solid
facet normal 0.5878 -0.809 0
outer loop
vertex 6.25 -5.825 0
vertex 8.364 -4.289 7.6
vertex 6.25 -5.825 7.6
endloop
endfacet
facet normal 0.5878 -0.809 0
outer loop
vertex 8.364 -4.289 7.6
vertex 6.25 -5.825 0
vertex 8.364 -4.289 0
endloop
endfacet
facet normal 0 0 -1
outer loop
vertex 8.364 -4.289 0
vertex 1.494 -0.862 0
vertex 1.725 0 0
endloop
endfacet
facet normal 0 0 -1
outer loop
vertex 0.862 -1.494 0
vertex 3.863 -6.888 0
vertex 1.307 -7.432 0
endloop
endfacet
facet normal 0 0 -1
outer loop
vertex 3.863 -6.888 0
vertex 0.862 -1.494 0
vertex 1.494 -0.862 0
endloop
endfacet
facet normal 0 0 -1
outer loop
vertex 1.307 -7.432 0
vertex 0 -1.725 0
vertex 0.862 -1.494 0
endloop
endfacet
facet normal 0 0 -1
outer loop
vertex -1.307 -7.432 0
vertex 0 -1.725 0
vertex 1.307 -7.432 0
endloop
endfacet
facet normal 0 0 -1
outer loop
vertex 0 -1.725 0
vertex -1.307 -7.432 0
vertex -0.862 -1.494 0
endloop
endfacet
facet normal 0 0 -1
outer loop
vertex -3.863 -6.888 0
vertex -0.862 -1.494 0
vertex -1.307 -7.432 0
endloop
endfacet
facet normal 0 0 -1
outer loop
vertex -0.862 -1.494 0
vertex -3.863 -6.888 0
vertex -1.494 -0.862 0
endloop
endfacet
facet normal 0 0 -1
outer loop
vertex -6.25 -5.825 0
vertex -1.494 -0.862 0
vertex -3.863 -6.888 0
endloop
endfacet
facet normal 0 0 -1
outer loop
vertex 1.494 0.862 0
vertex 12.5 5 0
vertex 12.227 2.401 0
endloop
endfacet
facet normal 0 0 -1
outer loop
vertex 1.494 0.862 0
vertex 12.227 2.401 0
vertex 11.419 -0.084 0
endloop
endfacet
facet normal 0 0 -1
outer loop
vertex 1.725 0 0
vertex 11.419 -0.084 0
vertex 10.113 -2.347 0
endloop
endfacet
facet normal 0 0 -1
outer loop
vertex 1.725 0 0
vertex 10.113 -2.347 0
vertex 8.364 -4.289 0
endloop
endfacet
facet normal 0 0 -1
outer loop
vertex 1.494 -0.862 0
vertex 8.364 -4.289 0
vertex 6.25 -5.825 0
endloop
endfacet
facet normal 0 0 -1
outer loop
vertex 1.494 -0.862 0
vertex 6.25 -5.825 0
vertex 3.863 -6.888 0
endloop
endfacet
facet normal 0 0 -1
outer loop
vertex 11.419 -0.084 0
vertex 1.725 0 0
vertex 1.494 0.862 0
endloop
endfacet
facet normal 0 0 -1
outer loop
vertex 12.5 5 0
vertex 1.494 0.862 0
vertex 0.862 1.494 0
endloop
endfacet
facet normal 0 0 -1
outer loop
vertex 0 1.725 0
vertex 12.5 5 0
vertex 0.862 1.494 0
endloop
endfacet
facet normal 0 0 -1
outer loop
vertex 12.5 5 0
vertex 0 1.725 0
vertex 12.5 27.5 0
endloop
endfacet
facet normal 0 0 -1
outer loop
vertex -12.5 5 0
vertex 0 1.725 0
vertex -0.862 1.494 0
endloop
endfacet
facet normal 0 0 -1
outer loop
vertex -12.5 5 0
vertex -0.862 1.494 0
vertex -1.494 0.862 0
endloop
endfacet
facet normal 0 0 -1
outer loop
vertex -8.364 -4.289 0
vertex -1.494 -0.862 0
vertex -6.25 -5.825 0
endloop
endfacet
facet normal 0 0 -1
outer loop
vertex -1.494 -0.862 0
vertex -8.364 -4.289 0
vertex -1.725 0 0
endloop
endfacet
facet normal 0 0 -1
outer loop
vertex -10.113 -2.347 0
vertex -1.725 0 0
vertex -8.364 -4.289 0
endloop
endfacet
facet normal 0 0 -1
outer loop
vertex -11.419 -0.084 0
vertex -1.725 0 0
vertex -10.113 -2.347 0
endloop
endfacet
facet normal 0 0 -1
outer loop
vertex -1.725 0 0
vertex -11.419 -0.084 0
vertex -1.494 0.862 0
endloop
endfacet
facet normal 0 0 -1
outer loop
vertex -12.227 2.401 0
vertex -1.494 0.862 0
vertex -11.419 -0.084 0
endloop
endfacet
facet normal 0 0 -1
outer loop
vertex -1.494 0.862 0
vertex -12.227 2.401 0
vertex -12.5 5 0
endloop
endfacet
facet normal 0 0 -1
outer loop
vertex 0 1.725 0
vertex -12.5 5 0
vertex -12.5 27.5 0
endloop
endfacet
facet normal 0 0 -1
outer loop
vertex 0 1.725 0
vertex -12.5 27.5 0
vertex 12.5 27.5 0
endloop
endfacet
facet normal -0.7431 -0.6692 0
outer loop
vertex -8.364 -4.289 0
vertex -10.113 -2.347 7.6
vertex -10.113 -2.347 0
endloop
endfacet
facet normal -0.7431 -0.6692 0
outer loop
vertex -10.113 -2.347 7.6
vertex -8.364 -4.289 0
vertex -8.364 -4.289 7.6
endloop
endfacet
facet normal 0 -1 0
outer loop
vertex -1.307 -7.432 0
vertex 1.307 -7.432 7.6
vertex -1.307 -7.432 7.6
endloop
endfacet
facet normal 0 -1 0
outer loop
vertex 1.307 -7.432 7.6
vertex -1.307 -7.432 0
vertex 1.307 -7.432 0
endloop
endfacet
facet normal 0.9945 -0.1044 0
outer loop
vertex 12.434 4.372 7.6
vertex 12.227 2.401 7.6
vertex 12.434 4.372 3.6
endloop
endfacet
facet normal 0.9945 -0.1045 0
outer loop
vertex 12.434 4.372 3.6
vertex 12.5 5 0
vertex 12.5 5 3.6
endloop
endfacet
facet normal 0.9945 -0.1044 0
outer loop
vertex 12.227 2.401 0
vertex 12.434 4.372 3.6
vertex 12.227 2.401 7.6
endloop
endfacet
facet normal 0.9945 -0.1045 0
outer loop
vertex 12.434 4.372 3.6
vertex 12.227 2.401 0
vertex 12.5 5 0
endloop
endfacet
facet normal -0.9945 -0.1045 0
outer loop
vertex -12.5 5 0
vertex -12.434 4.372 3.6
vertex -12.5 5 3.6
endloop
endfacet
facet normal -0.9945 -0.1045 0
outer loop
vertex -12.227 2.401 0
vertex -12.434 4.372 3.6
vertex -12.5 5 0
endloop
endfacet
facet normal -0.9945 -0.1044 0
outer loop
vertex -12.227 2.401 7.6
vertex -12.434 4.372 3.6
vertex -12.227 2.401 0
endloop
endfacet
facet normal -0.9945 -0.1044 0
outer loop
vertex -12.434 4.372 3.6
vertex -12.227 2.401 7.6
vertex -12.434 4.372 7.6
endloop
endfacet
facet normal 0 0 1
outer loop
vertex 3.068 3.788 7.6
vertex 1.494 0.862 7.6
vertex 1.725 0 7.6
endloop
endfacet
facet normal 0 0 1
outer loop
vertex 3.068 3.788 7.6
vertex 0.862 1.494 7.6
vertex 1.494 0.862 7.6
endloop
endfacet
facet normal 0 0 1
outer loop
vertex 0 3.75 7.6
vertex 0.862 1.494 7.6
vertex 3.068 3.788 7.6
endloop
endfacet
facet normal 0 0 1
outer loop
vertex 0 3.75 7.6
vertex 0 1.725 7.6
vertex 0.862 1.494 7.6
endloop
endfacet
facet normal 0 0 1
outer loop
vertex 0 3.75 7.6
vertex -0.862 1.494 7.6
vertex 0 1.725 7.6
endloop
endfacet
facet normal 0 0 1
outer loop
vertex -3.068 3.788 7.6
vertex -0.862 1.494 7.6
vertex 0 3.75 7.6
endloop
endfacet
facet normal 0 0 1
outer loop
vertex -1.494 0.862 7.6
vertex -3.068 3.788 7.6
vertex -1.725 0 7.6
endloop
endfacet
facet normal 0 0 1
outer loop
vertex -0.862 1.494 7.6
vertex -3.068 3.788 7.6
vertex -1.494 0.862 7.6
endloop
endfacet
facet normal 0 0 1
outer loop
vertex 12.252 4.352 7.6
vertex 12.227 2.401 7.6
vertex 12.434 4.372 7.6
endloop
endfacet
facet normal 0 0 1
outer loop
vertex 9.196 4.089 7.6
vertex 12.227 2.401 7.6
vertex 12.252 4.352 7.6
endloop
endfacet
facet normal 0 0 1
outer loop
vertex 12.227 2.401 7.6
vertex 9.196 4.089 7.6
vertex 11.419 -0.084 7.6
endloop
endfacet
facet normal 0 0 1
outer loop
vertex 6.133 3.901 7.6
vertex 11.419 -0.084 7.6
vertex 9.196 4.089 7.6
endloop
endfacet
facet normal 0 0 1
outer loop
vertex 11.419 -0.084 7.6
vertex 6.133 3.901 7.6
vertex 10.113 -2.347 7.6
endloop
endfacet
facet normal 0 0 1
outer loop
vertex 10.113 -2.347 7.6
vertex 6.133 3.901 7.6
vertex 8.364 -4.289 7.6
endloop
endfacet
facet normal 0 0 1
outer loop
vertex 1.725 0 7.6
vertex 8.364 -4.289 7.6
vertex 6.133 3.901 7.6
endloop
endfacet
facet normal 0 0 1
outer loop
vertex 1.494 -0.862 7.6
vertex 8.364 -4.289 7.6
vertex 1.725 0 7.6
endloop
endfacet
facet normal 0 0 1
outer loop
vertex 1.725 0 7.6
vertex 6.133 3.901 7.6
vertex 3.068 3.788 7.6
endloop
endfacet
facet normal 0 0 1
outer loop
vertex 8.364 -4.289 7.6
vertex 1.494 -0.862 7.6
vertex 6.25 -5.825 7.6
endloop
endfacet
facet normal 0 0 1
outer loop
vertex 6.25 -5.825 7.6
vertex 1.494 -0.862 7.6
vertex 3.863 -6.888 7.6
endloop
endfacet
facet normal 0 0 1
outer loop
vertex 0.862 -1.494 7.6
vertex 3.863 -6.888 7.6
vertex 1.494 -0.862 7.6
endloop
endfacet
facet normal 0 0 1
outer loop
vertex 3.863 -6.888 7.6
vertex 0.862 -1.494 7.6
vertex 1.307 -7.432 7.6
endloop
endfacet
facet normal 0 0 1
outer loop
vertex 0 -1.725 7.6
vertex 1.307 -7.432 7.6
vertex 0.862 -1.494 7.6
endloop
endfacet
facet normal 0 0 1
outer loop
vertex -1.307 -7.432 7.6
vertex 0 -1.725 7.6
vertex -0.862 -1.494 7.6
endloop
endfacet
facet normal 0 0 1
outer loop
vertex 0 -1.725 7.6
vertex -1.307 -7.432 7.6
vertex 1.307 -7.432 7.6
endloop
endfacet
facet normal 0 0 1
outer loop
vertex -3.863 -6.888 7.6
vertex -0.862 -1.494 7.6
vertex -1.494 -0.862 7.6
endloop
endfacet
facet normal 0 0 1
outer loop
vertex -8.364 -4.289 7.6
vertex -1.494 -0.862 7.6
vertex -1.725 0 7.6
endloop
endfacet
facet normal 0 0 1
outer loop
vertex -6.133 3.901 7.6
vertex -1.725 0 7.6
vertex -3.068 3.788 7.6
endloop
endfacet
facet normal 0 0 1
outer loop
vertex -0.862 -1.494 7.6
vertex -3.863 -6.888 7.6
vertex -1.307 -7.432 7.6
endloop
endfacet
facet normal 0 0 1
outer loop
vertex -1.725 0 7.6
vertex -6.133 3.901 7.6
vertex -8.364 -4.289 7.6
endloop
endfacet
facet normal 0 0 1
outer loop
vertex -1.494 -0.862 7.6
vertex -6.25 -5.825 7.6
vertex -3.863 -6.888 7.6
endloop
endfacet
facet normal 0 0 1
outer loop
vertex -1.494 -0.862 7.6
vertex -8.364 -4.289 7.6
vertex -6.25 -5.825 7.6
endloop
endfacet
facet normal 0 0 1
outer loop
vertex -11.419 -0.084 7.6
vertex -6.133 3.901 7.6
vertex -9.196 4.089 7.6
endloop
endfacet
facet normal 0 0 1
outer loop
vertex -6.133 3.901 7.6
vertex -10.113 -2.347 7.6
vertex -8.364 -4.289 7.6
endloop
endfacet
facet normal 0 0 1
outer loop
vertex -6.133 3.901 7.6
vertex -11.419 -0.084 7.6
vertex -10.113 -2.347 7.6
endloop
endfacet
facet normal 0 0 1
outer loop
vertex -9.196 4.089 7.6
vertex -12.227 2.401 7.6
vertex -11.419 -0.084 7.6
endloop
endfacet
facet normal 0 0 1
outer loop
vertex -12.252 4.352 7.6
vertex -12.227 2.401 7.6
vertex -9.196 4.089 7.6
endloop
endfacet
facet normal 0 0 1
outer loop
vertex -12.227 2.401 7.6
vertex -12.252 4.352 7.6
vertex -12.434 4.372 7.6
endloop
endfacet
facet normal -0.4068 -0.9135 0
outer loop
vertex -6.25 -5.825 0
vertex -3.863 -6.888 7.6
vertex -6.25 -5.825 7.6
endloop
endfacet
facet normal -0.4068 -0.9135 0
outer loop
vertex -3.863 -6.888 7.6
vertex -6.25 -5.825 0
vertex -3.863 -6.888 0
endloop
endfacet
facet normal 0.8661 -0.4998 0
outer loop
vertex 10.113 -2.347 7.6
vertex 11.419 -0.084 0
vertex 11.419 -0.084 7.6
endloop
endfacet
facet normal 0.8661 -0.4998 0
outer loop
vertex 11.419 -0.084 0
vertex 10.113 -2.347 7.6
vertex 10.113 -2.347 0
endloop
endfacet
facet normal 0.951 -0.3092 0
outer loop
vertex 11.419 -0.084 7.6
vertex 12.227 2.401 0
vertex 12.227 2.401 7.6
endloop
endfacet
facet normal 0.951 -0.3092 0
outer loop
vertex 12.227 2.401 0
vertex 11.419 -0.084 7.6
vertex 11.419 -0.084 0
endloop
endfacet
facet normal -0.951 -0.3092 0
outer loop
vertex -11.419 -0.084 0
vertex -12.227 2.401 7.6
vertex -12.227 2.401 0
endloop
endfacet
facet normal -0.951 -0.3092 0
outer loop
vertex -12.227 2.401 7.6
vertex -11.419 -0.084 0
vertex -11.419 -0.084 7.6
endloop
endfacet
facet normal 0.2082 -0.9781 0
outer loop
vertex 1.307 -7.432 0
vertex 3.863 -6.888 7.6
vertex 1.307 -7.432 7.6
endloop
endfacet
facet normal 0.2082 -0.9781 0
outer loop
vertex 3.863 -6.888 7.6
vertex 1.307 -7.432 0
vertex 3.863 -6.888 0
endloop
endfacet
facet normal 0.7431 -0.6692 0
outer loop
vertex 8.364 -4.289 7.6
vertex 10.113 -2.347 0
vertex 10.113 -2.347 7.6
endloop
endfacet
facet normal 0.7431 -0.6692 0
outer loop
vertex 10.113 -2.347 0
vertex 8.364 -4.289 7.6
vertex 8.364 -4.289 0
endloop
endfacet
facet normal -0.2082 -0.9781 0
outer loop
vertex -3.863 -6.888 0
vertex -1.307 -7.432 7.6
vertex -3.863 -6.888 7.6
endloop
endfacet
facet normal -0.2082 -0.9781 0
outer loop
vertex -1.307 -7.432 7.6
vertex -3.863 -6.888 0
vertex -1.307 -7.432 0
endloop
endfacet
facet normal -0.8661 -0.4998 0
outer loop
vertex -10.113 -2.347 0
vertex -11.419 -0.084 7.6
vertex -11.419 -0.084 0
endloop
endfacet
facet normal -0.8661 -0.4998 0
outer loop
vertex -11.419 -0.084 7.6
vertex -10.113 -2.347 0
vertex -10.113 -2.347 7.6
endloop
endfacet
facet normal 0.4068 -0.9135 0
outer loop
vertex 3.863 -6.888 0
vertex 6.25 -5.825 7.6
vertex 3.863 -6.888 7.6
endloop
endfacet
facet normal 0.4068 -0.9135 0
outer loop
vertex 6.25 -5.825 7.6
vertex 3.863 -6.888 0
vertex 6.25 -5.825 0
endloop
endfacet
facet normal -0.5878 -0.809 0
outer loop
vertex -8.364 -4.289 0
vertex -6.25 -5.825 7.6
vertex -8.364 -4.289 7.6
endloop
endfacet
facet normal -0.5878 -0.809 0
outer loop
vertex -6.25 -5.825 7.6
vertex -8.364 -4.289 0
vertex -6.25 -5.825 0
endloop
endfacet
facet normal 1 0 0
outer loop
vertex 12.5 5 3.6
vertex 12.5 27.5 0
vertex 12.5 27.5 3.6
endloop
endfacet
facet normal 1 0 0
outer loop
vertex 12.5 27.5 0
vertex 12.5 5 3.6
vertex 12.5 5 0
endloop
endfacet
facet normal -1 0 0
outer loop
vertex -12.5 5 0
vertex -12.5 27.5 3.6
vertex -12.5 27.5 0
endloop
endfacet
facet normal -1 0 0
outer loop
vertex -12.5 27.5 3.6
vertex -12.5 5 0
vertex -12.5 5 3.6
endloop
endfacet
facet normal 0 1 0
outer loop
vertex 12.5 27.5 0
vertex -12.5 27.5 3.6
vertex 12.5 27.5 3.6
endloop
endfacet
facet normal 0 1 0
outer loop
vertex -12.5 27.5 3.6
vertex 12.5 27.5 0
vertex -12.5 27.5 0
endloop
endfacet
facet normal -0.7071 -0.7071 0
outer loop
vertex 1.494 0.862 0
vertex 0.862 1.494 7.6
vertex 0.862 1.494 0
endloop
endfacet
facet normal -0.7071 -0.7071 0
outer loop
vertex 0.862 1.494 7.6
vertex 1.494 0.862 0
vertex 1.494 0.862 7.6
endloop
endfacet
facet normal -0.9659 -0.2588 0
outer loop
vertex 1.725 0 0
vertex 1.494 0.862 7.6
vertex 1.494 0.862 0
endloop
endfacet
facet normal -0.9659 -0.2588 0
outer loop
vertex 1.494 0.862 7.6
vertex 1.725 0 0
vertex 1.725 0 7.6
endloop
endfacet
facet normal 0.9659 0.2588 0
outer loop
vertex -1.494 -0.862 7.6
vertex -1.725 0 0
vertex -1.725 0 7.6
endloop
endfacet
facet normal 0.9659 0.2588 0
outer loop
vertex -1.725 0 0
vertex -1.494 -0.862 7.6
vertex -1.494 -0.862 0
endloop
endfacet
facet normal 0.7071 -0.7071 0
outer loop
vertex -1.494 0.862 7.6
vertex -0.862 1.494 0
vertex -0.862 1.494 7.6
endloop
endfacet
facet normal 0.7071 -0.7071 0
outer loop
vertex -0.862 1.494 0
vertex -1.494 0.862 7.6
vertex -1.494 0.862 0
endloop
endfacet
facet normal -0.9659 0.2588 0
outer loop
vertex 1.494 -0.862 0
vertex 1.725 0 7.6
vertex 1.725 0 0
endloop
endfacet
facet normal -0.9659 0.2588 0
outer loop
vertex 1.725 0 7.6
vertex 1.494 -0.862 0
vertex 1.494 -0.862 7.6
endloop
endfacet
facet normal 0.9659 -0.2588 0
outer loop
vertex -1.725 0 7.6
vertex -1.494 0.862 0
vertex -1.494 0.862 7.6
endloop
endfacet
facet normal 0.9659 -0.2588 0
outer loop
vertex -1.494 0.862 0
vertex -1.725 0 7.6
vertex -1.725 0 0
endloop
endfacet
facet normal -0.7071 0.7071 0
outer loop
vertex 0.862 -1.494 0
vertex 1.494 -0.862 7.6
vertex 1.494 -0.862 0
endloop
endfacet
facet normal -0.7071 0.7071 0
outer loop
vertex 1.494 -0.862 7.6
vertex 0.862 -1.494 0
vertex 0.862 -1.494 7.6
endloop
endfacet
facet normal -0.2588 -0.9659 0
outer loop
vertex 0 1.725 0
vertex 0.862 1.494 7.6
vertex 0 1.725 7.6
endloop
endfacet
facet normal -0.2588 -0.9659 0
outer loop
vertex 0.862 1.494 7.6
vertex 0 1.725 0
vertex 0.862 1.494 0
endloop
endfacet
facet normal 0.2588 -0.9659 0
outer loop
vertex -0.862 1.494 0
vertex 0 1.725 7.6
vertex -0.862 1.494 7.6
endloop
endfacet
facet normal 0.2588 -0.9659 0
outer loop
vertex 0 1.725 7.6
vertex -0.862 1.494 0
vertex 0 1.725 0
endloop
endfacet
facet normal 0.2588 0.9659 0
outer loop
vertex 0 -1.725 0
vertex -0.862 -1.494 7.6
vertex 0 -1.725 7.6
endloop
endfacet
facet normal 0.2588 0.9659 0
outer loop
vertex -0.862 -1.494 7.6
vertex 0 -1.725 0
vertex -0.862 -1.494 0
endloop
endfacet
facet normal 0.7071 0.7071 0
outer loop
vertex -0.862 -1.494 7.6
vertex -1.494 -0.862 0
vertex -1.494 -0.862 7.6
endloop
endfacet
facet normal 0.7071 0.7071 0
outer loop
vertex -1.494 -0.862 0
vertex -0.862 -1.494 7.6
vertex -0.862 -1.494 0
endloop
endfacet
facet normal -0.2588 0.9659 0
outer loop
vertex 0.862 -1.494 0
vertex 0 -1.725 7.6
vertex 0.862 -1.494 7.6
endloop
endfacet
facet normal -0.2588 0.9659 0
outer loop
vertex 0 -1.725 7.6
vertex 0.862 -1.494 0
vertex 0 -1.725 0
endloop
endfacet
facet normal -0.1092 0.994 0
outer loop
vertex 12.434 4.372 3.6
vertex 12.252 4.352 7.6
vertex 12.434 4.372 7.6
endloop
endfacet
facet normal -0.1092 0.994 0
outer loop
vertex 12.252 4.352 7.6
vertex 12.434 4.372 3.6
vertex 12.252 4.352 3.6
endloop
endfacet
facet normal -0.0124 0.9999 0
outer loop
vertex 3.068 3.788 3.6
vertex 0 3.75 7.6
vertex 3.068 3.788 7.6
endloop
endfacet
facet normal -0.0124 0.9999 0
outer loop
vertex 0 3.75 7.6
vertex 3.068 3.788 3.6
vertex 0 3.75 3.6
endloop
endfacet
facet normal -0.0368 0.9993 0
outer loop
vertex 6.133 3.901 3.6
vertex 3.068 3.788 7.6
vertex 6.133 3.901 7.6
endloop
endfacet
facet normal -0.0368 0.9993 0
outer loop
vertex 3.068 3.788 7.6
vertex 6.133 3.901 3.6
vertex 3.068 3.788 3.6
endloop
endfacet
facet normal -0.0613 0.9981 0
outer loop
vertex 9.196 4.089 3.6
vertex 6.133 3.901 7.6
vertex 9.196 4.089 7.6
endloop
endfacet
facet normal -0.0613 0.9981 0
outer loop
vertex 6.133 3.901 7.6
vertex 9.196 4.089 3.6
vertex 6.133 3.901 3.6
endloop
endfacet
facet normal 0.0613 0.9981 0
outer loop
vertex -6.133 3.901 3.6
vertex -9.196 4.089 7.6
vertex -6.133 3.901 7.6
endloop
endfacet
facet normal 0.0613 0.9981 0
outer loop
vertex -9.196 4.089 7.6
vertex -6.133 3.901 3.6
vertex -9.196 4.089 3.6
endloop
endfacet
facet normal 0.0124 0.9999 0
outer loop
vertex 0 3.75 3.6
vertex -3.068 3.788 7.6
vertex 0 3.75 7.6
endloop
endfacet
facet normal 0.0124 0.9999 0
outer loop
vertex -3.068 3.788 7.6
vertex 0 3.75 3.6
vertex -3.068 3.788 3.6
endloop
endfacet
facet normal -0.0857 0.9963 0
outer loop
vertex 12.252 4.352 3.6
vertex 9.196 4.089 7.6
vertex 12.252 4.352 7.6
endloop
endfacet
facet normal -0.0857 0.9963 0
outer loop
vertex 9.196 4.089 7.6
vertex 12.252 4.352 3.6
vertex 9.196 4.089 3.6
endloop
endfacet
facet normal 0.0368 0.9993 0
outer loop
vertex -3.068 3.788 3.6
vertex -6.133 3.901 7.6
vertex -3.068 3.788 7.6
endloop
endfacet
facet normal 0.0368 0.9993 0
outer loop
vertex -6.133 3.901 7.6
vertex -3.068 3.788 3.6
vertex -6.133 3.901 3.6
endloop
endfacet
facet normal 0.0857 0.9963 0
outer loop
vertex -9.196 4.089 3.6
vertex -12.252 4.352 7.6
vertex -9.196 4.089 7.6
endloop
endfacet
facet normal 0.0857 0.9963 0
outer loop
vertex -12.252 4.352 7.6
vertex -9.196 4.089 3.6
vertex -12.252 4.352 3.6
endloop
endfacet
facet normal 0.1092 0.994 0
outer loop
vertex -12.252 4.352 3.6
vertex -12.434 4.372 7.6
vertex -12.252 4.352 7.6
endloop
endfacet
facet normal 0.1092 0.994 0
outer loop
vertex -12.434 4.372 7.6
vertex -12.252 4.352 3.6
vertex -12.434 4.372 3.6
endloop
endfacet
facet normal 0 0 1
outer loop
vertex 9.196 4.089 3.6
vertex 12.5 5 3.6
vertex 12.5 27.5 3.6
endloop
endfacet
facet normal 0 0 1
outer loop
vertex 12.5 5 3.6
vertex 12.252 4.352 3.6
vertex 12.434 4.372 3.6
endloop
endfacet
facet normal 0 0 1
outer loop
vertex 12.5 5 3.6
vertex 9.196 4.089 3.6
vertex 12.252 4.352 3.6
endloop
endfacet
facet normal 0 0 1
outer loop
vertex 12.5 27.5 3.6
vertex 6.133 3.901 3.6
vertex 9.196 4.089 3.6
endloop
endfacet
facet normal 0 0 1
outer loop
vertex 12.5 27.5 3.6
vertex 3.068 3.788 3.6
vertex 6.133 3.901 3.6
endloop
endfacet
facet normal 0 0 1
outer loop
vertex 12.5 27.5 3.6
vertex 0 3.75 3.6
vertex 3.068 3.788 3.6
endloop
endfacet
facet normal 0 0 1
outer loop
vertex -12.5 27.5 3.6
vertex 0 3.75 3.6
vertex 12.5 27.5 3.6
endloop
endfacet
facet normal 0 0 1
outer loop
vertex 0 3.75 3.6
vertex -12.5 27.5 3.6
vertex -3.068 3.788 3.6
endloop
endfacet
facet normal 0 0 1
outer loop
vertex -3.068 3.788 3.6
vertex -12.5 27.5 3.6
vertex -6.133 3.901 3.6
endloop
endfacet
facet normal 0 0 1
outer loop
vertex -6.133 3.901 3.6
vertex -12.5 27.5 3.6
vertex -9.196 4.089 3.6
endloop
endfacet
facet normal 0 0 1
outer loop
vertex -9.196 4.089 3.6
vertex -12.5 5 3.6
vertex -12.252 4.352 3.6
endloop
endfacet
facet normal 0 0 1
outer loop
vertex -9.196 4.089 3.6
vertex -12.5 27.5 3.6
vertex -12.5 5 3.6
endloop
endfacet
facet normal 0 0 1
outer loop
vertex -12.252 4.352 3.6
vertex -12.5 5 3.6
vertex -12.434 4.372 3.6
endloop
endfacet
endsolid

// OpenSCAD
// file: configuration.scad
// Increase this if your slicer or printer make holes too tight.
extra_radius = 0.1;

// OD = outside diameter, corner to corner.
m3_nut_od = 6.1;
m3_nut_radius = m3_nut_od/2 + 0.2 + extra_radius;
m3_washer_radius = 3.5 + extra_radius;

// Major diameter of metric 3mm thread.
m3_major = 2.85;
m3_radius = m3_major/2 + extra_radius;
m3_wide_radius = m3_major/2 + extra_radius + 0.2;
// For M3 holes that needs to be tapped in the plastic
m3_tap_radius = 2.5/2 + extra_radius;

// NEMA17 stepper motors.
motor_shaft_diameter = 5;
motor_shaft_radius = motor_shaft_diameter/2 + extra_radius;

// Frame brackets. M3x8mm screws work best with 3.6 mm brackets.
thickness = 3.6;

// OpenBeam or Misumi. Currently only 15x15 mm, but there is a plan
// to make models more parametric and allow 20x20 mm in the future.
extrusion = 15;

// Placement for the NEMA17 stepper motors.
motor_offset = 44;
motor_length = 47;
// main file
// Glass mounting tab with a glass grip lip.
//
// This tab only works for a glass size that is large enough to overlap the
// horizontal beams. It can be moved away from the beam center on all three
// sides, but still snuggly grip the class in the exact curved grip when all
// three sides are secured right up to the glass.


// For 'extrusion' and 'thickness' values
include <configuration.scad>;

tab_width = 25;
tab_len = 20;       // This is the length from the extrusion into the body
grip_thickness = 4; // How thick the grip part on top should be
glass_diameter = 250; // Diameter of the glass
// How far the glass needs to be offset from the mounting screw head. This
// should be large enough to give enough space for the screw head if the glass
// sticks out above the grip lip.
// Assuming the M3 screws being used has a 6mm head size, then about 3.8mm will give enough clearance.
glass_screwhead_offset = (extrusion/2)/2;

// Make the round edge line up with the outside of OpenBeam.
screw_offset = tab_width/2 - extrusion/2;
// The length of the inset into the frame, but the square part starts at the
// center of the round part.`
cube_length = tab_len + (extrusion - tab_width/2);
// The full tab thickness before cutting out the glass fitting part.
tab_thickness = thickness + grip_thickness;

module glass_tab() {
  difference() {
    translate([0, screw_offset, 0])
        union() {
          cylinder(r=tab_width/2, h=tab_thickness, center=true);
          translate([0, cube_length/2, 0])
            cube([tab_width, cube_length, tab_thickness], center=true);
        }
    // The screw hole
    cylinder(r=m3_wide_radius, h=20, center=true, $fn=12);
    // The cutout for the tab grip
    translate([0, glass_screwhead_offset+glass_diameter/2, thickness/2+1])
        #cylinder(d=glass_diameter, h=grip_thickness+2, center=true, $fn=256);
  }
}

translate([0, 0, tab_thickness/2])
    glass_tab();
// Measure to make sure tab length is correct
*translate([tab_width/2, extrusion/2, 0])
    cube([2, tab_len, 10]);
// Horizontal OpenBeam.
translate([0, 0, -extrusion/2])
    %cube([100, extrusion, extrusion], center=true);
